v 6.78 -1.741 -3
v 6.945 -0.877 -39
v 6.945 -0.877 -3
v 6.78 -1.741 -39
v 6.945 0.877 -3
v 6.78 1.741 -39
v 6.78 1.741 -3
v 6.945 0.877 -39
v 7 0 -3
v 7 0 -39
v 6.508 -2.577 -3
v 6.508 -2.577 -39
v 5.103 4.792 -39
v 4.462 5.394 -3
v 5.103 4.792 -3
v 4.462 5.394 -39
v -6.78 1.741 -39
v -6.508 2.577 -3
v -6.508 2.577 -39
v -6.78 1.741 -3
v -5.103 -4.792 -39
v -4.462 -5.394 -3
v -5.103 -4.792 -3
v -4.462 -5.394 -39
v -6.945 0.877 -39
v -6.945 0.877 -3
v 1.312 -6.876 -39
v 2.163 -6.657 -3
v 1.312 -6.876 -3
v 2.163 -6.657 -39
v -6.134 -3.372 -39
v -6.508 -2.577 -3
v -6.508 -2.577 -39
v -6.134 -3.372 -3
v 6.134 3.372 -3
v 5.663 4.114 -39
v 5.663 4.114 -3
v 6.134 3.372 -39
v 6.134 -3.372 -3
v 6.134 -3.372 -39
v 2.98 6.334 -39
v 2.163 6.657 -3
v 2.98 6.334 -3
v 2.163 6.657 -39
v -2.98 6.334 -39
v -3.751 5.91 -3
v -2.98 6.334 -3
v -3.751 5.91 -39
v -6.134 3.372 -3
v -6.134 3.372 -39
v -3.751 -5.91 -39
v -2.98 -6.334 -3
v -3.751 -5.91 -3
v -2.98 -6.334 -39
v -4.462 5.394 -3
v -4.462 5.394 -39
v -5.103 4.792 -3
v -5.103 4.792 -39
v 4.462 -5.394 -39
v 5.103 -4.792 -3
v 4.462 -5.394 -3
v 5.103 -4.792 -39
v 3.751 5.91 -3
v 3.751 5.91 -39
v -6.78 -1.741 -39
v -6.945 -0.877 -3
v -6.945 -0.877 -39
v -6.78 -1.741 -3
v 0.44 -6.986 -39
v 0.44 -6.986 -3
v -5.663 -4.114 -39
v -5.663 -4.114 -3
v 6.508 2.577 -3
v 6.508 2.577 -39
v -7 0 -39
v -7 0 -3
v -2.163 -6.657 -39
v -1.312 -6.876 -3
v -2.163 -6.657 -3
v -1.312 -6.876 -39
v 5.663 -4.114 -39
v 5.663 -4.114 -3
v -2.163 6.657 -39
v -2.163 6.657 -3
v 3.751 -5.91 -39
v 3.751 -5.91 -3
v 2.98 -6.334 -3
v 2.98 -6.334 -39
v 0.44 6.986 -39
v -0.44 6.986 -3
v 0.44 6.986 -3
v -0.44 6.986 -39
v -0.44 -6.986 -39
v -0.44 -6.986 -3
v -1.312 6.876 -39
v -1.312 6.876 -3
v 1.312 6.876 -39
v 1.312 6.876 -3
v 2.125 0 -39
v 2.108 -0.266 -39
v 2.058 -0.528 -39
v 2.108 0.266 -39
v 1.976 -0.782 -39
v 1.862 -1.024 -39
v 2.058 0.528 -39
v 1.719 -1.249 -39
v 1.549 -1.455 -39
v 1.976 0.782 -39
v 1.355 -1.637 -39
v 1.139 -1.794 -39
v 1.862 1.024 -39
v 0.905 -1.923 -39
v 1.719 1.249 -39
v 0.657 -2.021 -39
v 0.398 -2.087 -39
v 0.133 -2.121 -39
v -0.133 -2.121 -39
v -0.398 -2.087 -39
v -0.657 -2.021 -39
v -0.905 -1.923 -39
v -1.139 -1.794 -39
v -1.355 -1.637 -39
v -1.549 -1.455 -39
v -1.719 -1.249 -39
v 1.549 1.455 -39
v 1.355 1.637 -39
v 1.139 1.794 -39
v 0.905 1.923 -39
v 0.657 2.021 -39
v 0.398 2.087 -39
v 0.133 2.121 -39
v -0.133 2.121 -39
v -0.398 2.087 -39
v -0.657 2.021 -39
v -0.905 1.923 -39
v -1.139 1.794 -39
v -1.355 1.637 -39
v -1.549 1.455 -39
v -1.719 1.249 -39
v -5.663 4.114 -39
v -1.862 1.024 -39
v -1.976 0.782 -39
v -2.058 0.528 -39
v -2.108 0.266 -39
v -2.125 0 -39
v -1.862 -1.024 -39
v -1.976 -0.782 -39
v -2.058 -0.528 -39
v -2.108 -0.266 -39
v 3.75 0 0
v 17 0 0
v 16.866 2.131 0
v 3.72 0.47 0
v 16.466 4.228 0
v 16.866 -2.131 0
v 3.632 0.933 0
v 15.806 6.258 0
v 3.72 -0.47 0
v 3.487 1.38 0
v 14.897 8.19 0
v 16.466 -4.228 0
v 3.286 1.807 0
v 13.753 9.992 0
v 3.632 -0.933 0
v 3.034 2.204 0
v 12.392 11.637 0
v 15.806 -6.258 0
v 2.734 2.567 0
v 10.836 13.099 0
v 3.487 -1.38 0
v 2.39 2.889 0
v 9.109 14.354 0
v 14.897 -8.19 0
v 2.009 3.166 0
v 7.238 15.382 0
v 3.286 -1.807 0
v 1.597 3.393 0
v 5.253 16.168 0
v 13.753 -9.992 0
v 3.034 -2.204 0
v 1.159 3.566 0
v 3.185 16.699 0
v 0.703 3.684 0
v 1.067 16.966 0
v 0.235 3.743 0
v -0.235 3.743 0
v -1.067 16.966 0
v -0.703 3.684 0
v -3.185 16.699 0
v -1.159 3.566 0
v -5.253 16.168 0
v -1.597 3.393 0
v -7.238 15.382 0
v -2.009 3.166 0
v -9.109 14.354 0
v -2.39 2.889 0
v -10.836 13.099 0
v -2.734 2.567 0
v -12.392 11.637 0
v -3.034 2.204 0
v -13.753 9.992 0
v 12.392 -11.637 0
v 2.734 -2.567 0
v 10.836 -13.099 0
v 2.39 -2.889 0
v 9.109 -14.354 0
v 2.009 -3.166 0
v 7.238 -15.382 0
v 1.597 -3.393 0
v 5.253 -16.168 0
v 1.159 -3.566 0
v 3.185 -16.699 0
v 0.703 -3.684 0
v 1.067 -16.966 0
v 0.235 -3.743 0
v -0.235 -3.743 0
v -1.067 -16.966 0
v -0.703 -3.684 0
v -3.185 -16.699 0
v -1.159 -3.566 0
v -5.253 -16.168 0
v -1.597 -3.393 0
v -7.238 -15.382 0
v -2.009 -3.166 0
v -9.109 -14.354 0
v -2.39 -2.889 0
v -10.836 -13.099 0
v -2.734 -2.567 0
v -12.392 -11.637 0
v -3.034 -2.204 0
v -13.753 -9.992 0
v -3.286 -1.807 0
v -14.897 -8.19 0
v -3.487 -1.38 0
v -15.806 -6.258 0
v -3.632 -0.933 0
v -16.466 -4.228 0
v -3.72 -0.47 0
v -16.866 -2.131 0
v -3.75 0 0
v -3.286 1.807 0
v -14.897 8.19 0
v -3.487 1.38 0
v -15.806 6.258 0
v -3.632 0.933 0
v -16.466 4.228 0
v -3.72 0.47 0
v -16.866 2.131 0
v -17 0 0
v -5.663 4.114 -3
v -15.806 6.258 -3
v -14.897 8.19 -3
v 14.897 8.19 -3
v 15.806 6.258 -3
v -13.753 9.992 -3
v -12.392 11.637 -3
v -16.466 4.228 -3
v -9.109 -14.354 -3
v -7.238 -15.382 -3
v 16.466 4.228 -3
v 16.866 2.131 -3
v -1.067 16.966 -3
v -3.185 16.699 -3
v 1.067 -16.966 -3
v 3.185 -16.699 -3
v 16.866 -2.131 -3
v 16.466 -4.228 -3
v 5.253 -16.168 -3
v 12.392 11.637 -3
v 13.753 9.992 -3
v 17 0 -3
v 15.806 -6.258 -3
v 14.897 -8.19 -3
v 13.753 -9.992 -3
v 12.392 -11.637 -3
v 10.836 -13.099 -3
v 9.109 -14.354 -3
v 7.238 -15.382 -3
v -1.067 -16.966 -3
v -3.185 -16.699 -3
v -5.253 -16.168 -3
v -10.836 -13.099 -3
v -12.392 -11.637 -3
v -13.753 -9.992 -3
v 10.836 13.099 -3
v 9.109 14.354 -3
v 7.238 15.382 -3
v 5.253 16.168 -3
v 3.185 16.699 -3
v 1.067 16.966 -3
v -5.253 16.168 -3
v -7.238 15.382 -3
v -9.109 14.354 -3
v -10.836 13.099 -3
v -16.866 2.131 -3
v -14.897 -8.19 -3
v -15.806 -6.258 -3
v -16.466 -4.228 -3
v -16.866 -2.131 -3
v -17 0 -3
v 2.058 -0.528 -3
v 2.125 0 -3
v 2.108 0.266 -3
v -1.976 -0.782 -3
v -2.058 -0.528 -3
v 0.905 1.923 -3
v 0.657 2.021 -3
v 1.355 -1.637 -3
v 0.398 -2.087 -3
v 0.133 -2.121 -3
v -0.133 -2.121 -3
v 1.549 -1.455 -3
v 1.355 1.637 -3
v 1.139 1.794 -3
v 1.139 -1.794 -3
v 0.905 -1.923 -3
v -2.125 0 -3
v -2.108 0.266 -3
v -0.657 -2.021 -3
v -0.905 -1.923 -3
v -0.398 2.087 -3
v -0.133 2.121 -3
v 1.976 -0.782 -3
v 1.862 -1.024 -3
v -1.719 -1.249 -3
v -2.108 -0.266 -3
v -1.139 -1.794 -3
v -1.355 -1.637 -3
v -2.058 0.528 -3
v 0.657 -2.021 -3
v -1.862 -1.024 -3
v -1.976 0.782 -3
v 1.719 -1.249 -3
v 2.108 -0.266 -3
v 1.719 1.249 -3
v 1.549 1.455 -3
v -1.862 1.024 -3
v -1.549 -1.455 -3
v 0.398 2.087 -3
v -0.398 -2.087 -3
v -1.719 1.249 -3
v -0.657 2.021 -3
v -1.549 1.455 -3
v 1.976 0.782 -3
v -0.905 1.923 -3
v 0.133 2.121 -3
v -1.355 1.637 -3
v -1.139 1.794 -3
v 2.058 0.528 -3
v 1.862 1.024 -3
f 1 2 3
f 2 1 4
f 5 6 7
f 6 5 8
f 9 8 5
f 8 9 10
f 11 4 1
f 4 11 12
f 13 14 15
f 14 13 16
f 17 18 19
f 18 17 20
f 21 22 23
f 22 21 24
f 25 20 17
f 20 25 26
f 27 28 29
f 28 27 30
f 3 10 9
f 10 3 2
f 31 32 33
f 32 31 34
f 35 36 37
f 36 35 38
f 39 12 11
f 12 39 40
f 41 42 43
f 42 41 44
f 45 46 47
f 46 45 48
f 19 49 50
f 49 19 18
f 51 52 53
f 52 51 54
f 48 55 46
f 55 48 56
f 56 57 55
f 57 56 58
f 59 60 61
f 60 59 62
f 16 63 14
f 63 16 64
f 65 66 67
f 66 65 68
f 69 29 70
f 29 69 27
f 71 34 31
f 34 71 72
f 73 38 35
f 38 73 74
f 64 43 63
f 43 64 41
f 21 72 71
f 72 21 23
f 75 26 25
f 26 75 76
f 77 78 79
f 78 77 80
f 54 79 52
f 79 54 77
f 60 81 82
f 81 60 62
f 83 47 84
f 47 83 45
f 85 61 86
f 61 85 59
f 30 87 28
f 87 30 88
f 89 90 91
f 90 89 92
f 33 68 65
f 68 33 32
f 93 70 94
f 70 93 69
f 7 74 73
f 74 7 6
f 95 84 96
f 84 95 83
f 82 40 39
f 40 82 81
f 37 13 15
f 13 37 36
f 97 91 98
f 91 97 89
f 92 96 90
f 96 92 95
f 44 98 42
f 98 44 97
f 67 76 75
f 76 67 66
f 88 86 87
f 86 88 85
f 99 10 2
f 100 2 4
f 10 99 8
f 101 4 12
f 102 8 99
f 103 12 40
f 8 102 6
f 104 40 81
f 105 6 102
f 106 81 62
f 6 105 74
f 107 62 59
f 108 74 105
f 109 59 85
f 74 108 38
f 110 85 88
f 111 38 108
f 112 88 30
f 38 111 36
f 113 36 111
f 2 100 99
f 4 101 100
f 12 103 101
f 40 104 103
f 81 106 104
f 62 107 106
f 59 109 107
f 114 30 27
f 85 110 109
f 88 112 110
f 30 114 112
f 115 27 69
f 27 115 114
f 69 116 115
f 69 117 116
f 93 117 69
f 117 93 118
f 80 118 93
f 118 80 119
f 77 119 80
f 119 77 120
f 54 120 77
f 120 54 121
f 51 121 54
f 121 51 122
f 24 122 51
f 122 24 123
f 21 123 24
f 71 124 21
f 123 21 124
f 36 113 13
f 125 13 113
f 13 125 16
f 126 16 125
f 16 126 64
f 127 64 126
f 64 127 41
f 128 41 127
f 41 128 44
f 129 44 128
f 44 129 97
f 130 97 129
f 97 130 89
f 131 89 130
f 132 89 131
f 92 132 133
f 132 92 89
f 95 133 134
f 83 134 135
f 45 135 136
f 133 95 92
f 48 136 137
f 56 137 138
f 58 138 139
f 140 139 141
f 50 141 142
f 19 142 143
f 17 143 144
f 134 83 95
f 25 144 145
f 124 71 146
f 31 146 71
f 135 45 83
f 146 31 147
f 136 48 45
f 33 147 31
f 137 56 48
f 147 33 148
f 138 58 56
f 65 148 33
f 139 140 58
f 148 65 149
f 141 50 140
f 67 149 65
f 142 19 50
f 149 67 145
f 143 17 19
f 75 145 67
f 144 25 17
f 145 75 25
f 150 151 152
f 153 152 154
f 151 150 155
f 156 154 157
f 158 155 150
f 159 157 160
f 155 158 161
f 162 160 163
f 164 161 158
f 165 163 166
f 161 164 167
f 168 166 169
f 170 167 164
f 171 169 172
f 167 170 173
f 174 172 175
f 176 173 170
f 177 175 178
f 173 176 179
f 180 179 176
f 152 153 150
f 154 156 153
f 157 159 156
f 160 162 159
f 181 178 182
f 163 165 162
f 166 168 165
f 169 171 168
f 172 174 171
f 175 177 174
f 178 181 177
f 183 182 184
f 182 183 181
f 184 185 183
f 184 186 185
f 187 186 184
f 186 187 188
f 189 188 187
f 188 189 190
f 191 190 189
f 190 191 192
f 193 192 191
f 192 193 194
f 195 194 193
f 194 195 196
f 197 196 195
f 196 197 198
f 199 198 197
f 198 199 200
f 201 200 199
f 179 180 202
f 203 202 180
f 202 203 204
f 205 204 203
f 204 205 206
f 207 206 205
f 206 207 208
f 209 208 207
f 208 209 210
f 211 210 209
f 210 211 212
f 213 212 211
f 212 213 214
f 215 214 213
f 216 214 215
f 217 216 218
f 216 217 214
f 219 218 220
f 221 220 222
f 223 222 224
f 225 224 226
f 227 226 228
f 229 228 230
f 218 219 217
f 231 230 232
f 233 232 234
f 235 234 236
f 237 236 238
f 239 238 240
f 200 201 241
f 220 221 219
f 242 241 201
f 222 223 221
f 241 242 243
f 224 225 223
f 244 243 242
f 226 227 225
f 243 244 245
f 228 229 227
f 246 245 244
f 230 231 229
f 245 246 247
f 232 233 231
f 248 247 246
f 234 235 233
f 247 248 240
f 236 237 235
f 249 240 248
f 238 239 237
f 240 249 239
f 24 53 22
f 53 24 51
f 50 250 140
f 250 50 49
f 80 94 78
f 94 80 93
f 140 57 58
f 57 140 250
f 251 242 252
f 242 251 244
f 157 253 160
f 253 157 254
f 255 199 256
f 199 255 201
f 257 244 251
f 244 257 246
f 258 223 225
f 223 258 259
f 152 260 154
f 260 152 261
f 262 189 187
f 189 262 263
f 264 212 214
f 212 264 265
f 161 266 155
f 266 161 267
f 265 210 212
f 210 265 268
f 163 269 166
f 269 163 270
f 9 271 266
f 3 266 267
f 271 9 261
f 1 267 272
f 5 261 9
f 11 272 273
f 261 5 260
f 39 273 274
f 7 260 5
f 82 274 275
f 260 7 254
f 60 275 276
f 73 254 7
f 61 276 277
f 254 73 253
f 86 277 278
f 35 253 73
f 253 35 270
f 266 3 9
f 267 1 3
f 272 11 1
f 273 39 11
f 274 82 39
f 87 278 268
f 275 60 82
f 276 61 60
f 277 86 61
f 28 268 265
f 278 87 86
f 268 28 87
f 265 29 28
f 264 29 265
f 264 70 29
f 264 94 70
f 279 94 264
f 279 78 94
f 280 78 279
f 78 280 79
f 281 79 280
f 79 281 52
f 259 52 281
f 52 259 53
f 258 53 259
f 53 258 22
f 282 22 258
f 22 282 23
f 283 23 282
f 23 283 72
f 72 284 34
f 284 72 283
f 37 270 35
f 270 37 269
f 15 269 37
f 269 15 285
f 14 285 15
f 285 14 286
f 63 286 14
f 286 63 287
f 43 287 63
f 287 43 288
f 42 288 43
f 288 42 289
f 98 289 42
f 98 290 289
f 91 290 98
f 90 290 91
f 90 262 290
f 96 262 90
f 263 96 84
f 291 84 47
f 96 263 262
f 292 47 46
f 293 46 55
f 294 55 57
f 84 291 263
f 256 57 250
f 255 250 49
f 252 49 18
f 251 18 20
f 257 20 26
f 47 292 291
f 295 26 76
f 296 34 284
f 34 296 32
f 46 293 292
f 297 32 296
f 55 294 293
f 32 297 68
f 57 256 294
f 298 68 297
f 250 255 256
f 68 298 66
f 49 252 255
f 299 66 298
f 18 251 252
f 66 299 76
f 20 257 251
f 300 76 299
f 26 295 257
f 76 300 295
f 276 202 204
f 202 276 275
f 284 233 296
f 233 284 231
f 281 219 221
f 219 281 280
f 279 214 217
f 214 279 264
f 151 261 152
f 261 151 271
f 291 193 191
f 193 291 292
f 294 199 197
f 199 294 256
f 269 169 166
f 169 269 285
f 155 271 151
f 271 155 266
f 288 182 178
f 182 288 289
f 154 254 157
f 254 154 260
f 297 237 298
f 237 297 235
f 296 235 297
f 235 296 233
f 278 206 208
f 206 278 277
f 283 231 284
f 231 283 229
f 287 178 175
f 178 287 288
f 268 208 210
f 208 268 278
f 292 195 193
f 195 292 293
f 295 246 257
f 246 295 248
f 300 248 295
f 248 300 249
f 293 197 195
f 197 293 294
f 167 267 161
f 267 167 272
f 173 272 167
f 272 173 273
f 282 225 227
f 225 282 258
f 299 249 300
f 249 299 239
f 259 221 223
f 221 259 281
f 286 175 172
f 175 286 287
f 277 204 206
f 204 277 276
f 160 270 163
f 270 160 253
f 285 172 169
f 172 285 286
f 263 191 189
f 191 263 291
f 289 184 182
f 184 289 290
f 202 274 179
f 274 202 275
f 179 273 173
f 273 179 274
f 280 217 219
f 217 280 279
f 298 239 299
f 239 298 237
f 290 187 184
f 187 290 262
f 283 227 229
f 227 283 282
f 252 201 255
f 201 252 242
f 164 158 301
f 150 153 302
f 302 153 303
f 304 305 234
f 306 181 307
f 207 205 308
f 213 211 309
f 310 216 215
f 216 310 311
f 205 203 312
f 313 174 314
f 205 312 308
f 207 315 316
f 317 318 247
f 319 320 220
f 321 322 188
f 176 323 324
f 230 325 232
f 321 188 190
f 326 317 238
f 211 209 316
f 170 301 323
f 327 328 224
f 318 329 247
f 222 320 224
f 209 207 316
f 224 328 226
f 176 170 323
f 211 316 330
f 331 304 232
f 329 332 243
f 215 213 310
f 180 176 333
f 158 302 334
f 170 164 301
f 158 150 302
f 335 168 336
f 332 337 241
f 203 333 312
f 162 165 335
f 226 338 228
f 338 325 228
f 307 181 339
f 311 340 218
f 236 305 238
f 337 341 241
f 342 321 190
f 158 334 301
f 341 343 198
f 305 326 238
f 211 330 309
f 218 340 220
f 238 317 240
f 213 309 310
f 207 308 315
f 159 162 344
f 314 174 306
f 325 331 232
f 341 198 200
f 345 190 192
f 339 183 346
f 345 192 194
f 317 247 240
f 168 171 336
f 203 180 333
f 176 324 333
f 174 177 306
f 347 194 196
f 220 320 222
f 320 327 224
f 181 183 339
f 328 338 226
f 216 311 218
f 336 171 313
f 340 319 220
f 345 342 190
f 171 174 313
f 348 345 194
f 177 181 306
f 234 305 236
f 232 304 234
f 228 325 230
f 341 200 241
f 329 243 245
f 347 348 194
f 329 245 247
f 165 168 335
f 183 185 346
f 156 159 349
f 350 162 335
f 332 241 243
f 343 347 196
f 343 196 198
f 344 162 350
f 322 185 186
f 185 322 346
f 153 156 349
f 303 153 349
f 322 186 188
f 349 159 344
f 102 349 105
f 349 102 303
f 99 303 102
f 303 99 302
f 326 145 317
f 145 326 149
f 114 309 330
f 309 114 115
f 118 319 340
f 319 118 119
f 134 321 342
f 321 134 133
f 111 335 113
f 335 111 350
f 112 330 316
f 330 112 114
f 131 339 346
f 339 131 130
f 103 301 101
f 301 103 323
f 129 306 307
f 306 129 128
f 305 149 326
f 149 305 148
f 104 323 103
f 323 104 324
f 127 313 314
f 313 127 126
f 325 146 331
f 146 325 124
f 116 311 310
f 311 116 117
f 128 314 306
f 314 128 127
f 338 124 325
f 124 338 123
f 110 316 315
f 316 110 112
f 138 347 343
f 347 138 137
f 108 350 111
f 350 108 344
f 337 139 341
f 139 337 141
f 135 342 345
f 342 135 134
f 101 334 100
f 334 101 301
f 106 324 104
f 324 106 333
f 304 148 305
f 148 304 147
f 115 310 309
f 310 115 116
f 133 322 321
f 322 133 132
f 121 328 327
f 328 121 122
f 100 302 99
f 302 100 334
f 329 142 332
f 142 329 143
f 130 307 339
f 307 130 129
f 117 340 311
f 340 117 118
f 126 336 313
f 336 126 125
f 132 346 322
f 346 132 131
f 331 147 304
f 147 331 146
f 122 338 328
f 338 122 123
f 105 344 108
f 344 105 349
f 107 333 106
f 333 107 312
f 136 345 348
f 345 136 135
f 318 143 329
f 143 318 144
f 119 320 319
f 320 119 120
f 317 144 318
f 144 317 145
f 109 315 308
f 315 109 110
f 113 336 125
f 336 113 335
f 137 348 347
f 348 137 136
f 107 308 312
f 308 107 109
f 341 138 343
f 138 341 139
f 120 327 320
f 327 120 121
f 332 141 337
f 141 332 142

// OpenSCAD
$fn = 50;


difference() {
	union() {
		translate(v = [0, 0, -39.0000000000]) {
			cylinder(h = 39, r = 7.0000000000);
		}
		translate(v = [0, 0, -3.0000000000]) {
			cylinder(h = 3, r = 17.0000000000);
		}
	}
	union() {
		translate(v = [0, 0, 0]) {
			rotate(a = [0, 0, 0]) {
				difference() {
					union() {
						#translate(v = [0, 0, -39.0000000000]) {
							cylinder(h = 39, r = 2.0000000000);
						}
						#translate(v = [0, 0, -3]) {
							cylinder(h = 3, r = 7.0000000000, r1 = 2.1250000000, r2 = 3.7500000000);
						}
						#translate(v = [0, 0, -39.0000000000]) {
							cylinder(h = 39, r = 2.1250000000);
						}
						#translate(v = [0, 0, -39.0000000000]) {
							cylinder(h = 39, r = 2.0000000000);
						}
					}
					union();
				}
			}
		}
	}
}
